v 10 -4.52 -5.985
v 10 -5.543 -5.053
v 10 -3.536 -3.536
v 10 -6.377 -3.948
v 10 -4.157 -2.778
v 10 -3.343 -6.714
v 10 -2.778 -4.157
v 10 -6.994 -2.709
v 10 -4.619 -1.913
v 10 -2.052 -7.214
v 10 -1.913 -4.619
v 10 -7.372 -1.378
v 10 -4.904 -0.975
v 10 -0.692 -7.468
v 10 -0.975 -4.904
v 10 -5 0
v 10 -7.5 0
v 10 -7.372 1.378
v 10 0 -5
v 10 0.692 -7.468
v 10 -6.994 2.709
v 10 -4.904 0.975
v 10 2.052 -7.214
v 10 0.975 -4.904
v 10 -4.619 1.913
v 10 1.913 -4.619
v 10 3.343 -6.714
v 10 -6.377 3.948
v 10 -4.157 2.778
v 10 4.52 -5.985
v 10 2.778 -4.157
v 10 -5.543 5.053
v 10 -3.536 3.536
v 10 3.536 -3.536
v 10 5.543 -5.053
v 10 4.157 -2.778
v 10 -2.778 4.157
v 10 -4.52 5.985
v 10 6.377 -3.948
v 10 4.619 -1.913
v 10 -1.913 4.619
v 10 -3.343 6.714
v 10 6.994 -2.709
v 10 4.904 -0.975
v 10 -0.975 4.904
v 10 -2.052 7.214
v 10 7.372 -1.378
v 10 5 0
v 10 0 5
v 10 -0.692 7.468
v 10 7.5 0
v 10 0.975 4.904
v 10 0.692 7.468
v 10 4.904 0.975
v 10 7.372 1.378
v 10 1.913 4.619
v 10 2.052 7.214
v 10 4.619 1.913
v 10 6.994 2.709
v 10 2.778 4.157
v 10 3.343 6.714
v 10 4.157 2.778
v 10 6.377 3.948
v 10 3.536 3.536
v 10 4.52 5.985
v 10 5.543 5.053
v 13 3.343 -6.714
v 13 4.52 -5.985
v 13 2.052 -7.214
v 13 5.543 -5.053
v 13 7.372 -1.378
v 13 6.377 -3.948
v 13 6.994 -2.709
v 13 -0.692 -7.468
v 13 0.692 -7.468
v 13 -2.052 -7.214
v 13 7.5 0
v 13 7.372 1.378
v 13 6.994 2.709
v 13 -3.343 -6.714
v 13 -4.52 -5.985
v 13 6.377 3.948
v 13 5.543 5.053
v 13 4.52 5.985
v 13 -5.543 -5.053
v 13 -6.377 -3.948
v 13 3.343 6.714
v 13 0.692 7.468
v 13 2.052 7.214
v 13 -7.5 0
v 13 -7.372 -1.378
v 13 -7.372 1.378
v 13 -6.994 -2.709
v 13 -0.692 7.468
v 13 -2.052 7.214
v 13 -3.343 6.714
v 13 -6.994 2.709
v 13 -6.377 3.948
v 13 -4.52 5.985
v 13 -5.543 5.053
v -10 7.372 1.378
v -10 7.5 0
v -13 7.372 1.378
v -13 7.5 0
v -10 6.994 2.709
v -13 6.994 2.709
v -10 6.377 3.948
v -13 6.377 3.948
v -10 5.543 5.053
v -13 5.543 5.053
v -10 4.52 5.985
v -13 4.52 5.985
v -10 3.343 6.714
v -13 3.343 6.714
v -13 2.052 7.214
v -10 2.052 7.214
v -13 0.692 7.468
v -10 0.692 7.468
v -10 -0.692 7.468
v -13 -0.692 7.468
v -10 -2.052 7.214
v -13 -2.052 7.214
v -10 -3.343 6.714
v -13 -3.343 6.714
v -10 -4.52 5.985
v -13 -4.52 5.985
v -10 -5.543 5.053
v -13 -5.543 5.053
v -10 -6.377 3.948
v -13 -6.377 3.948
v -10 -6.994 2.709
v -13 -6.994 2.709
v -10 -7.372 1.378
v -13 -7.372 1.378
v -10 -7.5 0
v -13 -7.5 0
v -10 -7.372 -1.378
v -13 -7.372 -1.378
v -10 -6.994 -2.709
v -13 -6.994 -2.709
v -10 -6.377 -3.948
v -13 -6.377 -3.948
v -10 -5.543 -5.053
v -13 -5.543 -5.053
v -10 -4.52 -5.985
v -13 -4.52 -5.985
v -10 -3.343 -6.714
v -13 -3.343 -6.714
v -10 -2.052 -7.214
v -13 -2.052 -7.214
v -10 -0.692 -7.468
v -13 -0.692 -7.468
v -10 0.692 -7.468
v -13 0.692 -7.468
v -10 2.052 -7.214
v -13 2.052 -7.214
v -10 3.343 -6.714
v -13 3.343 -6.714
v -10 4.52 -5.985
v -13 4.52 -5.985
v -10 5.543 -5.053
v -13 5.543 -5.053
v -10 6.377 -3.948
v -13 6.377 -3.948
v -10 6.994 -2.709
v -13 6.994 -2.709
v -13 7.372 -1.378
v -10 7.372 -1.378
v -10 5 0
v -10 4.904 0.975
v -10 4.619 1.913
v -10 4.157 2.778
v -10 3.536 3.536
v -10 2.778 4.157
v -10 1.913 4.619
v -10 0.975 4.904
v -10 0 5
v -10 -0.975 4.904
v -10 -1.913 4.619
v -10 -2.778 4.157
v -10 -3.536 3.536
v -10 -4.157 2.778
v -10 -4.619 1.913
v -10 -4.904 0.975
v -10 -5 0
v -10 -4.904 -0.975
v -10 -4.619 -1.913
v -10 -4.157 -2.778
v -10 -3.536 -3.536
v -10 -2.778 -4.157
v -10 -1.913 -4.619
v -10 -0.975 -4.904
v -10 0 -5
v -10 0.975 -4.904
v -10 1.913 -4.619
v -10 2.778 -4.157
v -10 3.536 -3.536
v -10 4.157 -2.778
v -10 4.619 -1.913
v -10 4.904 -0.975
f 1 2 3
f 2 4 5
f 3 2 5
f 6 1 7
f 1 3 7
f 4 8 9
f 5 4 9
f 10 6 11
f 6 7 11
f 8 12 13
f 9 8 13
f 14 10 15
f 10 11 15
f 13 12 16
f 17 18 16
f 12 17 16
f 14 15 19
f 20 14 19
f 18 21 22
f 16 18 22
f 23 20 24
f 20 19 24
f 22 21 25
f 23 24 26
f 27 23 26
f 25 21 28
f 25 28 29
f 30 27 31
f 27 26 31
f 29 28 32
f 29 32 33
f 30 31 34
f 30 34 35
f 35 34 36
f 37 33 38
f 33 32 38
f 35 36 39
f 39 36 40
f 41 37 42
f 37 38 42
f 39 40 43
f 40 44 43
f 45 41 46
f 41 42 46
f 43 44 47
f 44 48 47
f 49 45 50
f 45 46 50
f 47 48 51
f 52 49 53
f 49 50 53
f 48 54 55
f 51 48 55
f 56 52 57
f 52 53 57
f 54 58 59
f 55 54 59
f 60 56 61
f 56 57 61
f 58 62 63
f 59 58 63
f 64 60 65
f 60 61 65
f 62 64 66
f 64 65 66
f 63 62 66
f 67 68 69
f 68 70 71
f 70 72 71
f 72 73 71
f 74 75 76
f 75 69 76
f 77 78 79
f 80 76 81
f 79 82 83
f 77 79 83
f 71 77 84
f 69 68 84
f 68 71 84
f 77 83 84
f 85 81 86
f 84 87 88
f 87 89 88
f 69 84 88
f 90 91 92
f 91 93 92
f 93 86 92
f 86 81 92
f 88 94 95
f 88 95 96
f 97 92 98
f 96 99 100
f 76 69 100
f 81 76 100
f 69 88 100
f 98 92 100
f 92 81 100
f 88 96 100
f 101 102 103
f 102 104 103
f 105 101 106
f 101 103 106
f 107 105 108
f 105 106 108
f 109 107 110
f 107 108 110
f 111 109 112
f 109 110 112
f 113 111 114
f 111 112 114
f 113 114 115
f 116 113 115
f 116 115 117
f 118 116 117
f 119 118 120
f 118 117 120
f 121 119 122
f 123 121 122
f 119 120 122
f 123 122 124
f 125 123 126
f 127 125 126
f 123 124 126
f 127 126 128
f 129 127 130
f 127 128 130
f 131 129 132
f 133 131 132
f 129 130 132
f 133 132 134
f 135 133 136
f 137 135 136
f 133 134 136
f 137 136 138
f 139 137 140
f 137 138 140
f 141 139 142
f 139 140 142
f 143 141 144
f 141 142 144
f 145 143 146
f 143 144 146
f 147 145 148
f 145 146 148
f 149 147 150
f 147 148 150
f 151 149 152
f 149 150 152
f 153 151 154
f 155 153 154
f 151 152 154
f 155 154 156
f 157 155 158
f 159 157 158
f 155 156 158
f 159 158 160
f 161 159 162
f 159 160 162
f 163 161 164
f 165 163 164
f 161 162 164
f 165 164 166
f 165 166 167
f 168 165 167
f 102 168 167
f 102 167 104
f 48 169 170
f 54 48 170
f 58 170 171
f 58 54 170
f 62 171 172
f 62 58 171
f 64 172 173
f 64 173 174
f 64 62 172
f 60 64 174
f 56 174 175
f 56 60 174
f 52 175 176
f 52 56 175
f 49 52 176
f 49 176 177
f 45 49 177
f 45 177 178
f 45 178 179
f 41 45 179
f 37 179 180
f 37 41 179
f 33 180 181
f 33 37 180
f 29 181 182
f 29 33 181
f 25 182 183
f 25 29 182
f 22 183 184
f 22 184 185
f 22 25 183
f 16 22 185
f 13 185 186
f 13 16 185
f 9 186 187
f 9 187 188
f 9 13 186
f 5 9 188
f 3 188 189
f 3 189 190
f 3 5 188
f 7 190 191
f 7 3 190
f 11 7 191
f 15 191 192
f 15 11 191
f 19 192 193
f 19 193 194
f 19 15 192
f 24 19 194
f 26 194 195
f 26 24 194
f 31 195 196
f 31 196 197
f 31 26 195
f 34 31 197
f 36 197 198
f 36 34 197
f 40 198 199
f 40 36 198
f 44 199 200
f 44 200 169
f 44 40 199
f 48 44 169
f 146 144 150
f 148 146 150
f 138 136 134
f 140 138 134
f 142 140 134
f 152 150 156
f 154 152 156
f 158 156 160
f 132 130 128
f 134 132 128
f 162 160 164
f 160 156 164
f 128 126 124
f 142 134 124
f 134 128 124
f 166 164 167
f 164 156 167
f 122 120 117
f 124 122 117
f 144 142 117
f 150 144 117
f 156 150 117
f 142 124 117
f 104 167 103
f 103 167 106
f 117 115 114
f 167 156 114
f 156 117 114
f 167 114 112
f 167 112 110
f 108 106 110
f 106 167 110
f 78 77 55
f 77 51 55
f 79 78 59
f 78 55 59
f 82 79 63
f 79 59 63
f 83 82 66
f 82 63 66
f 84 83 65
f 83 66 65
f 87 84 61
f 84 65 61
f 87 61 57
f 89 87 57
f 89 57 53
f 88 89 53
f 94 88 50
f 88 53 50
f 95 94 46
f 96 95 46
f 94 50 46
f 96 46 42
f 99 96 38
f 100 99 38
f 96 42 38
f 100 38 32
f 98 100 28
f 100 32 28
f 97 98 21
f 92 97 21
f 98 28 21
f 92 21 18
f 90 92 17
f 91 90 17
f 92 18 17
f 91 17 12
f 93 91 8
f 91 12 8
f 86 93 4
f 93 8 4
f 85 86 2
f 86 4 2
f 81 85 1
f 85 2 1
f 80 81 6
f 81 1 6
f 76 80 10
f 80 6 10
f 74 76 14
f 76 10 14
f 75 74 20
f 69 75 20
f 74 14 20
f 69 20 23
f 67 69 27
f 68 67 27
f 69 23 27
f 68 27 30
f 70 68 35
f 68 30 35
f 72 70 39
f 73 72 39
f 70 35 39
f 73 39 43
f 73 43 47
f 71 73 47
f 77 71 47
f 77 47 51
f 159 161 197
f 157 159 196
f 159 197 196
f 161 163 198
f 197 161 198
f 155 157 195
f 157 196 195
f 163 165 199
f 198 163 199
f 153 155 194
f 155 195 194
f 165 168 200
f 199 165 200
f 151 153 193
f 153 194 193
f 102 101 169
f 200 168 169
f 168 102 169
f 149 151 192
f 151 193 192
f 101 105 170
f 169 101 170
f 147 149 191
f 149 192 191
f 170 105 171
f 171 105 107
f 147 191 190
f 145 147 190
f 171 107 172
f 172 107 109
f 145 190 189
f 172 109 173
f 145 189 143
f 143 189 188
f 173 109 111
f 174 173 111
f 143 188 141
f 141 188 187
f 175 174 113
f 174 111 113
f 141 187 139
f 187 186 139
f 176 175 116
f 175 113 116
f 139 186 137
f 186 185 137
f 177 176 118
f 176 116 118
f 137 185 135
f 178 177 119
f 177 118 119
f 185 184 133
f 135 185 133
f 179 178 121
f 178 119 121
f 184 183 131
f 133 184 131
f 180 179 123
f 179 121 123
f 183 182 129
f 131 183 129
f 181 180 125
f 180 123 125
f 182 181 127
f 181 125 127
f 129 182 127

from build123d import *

# Parameters (mm, degrees)
F0_W = 20
F0_H = 5


with BuildPart() as f1:
    # F0 (on Top) → F1 (revolve)
    with BuildSketch(Plane.XY):
        Polygon((-10, 0), (-10, 5), (-10, 7.5), (-13, 7.5), (-13, 0), align=None)
        with Locations((0, 2.5)):
            Rectangle(F0_W, F0_H)
        Polygon((10, 7.5), (10, 5), (10, 0), (13, 0), (13, 7.5), align=None)
    revolve(axis=Axis((0, 0, 0), (1, 0, 0)))


solid = f1.part
